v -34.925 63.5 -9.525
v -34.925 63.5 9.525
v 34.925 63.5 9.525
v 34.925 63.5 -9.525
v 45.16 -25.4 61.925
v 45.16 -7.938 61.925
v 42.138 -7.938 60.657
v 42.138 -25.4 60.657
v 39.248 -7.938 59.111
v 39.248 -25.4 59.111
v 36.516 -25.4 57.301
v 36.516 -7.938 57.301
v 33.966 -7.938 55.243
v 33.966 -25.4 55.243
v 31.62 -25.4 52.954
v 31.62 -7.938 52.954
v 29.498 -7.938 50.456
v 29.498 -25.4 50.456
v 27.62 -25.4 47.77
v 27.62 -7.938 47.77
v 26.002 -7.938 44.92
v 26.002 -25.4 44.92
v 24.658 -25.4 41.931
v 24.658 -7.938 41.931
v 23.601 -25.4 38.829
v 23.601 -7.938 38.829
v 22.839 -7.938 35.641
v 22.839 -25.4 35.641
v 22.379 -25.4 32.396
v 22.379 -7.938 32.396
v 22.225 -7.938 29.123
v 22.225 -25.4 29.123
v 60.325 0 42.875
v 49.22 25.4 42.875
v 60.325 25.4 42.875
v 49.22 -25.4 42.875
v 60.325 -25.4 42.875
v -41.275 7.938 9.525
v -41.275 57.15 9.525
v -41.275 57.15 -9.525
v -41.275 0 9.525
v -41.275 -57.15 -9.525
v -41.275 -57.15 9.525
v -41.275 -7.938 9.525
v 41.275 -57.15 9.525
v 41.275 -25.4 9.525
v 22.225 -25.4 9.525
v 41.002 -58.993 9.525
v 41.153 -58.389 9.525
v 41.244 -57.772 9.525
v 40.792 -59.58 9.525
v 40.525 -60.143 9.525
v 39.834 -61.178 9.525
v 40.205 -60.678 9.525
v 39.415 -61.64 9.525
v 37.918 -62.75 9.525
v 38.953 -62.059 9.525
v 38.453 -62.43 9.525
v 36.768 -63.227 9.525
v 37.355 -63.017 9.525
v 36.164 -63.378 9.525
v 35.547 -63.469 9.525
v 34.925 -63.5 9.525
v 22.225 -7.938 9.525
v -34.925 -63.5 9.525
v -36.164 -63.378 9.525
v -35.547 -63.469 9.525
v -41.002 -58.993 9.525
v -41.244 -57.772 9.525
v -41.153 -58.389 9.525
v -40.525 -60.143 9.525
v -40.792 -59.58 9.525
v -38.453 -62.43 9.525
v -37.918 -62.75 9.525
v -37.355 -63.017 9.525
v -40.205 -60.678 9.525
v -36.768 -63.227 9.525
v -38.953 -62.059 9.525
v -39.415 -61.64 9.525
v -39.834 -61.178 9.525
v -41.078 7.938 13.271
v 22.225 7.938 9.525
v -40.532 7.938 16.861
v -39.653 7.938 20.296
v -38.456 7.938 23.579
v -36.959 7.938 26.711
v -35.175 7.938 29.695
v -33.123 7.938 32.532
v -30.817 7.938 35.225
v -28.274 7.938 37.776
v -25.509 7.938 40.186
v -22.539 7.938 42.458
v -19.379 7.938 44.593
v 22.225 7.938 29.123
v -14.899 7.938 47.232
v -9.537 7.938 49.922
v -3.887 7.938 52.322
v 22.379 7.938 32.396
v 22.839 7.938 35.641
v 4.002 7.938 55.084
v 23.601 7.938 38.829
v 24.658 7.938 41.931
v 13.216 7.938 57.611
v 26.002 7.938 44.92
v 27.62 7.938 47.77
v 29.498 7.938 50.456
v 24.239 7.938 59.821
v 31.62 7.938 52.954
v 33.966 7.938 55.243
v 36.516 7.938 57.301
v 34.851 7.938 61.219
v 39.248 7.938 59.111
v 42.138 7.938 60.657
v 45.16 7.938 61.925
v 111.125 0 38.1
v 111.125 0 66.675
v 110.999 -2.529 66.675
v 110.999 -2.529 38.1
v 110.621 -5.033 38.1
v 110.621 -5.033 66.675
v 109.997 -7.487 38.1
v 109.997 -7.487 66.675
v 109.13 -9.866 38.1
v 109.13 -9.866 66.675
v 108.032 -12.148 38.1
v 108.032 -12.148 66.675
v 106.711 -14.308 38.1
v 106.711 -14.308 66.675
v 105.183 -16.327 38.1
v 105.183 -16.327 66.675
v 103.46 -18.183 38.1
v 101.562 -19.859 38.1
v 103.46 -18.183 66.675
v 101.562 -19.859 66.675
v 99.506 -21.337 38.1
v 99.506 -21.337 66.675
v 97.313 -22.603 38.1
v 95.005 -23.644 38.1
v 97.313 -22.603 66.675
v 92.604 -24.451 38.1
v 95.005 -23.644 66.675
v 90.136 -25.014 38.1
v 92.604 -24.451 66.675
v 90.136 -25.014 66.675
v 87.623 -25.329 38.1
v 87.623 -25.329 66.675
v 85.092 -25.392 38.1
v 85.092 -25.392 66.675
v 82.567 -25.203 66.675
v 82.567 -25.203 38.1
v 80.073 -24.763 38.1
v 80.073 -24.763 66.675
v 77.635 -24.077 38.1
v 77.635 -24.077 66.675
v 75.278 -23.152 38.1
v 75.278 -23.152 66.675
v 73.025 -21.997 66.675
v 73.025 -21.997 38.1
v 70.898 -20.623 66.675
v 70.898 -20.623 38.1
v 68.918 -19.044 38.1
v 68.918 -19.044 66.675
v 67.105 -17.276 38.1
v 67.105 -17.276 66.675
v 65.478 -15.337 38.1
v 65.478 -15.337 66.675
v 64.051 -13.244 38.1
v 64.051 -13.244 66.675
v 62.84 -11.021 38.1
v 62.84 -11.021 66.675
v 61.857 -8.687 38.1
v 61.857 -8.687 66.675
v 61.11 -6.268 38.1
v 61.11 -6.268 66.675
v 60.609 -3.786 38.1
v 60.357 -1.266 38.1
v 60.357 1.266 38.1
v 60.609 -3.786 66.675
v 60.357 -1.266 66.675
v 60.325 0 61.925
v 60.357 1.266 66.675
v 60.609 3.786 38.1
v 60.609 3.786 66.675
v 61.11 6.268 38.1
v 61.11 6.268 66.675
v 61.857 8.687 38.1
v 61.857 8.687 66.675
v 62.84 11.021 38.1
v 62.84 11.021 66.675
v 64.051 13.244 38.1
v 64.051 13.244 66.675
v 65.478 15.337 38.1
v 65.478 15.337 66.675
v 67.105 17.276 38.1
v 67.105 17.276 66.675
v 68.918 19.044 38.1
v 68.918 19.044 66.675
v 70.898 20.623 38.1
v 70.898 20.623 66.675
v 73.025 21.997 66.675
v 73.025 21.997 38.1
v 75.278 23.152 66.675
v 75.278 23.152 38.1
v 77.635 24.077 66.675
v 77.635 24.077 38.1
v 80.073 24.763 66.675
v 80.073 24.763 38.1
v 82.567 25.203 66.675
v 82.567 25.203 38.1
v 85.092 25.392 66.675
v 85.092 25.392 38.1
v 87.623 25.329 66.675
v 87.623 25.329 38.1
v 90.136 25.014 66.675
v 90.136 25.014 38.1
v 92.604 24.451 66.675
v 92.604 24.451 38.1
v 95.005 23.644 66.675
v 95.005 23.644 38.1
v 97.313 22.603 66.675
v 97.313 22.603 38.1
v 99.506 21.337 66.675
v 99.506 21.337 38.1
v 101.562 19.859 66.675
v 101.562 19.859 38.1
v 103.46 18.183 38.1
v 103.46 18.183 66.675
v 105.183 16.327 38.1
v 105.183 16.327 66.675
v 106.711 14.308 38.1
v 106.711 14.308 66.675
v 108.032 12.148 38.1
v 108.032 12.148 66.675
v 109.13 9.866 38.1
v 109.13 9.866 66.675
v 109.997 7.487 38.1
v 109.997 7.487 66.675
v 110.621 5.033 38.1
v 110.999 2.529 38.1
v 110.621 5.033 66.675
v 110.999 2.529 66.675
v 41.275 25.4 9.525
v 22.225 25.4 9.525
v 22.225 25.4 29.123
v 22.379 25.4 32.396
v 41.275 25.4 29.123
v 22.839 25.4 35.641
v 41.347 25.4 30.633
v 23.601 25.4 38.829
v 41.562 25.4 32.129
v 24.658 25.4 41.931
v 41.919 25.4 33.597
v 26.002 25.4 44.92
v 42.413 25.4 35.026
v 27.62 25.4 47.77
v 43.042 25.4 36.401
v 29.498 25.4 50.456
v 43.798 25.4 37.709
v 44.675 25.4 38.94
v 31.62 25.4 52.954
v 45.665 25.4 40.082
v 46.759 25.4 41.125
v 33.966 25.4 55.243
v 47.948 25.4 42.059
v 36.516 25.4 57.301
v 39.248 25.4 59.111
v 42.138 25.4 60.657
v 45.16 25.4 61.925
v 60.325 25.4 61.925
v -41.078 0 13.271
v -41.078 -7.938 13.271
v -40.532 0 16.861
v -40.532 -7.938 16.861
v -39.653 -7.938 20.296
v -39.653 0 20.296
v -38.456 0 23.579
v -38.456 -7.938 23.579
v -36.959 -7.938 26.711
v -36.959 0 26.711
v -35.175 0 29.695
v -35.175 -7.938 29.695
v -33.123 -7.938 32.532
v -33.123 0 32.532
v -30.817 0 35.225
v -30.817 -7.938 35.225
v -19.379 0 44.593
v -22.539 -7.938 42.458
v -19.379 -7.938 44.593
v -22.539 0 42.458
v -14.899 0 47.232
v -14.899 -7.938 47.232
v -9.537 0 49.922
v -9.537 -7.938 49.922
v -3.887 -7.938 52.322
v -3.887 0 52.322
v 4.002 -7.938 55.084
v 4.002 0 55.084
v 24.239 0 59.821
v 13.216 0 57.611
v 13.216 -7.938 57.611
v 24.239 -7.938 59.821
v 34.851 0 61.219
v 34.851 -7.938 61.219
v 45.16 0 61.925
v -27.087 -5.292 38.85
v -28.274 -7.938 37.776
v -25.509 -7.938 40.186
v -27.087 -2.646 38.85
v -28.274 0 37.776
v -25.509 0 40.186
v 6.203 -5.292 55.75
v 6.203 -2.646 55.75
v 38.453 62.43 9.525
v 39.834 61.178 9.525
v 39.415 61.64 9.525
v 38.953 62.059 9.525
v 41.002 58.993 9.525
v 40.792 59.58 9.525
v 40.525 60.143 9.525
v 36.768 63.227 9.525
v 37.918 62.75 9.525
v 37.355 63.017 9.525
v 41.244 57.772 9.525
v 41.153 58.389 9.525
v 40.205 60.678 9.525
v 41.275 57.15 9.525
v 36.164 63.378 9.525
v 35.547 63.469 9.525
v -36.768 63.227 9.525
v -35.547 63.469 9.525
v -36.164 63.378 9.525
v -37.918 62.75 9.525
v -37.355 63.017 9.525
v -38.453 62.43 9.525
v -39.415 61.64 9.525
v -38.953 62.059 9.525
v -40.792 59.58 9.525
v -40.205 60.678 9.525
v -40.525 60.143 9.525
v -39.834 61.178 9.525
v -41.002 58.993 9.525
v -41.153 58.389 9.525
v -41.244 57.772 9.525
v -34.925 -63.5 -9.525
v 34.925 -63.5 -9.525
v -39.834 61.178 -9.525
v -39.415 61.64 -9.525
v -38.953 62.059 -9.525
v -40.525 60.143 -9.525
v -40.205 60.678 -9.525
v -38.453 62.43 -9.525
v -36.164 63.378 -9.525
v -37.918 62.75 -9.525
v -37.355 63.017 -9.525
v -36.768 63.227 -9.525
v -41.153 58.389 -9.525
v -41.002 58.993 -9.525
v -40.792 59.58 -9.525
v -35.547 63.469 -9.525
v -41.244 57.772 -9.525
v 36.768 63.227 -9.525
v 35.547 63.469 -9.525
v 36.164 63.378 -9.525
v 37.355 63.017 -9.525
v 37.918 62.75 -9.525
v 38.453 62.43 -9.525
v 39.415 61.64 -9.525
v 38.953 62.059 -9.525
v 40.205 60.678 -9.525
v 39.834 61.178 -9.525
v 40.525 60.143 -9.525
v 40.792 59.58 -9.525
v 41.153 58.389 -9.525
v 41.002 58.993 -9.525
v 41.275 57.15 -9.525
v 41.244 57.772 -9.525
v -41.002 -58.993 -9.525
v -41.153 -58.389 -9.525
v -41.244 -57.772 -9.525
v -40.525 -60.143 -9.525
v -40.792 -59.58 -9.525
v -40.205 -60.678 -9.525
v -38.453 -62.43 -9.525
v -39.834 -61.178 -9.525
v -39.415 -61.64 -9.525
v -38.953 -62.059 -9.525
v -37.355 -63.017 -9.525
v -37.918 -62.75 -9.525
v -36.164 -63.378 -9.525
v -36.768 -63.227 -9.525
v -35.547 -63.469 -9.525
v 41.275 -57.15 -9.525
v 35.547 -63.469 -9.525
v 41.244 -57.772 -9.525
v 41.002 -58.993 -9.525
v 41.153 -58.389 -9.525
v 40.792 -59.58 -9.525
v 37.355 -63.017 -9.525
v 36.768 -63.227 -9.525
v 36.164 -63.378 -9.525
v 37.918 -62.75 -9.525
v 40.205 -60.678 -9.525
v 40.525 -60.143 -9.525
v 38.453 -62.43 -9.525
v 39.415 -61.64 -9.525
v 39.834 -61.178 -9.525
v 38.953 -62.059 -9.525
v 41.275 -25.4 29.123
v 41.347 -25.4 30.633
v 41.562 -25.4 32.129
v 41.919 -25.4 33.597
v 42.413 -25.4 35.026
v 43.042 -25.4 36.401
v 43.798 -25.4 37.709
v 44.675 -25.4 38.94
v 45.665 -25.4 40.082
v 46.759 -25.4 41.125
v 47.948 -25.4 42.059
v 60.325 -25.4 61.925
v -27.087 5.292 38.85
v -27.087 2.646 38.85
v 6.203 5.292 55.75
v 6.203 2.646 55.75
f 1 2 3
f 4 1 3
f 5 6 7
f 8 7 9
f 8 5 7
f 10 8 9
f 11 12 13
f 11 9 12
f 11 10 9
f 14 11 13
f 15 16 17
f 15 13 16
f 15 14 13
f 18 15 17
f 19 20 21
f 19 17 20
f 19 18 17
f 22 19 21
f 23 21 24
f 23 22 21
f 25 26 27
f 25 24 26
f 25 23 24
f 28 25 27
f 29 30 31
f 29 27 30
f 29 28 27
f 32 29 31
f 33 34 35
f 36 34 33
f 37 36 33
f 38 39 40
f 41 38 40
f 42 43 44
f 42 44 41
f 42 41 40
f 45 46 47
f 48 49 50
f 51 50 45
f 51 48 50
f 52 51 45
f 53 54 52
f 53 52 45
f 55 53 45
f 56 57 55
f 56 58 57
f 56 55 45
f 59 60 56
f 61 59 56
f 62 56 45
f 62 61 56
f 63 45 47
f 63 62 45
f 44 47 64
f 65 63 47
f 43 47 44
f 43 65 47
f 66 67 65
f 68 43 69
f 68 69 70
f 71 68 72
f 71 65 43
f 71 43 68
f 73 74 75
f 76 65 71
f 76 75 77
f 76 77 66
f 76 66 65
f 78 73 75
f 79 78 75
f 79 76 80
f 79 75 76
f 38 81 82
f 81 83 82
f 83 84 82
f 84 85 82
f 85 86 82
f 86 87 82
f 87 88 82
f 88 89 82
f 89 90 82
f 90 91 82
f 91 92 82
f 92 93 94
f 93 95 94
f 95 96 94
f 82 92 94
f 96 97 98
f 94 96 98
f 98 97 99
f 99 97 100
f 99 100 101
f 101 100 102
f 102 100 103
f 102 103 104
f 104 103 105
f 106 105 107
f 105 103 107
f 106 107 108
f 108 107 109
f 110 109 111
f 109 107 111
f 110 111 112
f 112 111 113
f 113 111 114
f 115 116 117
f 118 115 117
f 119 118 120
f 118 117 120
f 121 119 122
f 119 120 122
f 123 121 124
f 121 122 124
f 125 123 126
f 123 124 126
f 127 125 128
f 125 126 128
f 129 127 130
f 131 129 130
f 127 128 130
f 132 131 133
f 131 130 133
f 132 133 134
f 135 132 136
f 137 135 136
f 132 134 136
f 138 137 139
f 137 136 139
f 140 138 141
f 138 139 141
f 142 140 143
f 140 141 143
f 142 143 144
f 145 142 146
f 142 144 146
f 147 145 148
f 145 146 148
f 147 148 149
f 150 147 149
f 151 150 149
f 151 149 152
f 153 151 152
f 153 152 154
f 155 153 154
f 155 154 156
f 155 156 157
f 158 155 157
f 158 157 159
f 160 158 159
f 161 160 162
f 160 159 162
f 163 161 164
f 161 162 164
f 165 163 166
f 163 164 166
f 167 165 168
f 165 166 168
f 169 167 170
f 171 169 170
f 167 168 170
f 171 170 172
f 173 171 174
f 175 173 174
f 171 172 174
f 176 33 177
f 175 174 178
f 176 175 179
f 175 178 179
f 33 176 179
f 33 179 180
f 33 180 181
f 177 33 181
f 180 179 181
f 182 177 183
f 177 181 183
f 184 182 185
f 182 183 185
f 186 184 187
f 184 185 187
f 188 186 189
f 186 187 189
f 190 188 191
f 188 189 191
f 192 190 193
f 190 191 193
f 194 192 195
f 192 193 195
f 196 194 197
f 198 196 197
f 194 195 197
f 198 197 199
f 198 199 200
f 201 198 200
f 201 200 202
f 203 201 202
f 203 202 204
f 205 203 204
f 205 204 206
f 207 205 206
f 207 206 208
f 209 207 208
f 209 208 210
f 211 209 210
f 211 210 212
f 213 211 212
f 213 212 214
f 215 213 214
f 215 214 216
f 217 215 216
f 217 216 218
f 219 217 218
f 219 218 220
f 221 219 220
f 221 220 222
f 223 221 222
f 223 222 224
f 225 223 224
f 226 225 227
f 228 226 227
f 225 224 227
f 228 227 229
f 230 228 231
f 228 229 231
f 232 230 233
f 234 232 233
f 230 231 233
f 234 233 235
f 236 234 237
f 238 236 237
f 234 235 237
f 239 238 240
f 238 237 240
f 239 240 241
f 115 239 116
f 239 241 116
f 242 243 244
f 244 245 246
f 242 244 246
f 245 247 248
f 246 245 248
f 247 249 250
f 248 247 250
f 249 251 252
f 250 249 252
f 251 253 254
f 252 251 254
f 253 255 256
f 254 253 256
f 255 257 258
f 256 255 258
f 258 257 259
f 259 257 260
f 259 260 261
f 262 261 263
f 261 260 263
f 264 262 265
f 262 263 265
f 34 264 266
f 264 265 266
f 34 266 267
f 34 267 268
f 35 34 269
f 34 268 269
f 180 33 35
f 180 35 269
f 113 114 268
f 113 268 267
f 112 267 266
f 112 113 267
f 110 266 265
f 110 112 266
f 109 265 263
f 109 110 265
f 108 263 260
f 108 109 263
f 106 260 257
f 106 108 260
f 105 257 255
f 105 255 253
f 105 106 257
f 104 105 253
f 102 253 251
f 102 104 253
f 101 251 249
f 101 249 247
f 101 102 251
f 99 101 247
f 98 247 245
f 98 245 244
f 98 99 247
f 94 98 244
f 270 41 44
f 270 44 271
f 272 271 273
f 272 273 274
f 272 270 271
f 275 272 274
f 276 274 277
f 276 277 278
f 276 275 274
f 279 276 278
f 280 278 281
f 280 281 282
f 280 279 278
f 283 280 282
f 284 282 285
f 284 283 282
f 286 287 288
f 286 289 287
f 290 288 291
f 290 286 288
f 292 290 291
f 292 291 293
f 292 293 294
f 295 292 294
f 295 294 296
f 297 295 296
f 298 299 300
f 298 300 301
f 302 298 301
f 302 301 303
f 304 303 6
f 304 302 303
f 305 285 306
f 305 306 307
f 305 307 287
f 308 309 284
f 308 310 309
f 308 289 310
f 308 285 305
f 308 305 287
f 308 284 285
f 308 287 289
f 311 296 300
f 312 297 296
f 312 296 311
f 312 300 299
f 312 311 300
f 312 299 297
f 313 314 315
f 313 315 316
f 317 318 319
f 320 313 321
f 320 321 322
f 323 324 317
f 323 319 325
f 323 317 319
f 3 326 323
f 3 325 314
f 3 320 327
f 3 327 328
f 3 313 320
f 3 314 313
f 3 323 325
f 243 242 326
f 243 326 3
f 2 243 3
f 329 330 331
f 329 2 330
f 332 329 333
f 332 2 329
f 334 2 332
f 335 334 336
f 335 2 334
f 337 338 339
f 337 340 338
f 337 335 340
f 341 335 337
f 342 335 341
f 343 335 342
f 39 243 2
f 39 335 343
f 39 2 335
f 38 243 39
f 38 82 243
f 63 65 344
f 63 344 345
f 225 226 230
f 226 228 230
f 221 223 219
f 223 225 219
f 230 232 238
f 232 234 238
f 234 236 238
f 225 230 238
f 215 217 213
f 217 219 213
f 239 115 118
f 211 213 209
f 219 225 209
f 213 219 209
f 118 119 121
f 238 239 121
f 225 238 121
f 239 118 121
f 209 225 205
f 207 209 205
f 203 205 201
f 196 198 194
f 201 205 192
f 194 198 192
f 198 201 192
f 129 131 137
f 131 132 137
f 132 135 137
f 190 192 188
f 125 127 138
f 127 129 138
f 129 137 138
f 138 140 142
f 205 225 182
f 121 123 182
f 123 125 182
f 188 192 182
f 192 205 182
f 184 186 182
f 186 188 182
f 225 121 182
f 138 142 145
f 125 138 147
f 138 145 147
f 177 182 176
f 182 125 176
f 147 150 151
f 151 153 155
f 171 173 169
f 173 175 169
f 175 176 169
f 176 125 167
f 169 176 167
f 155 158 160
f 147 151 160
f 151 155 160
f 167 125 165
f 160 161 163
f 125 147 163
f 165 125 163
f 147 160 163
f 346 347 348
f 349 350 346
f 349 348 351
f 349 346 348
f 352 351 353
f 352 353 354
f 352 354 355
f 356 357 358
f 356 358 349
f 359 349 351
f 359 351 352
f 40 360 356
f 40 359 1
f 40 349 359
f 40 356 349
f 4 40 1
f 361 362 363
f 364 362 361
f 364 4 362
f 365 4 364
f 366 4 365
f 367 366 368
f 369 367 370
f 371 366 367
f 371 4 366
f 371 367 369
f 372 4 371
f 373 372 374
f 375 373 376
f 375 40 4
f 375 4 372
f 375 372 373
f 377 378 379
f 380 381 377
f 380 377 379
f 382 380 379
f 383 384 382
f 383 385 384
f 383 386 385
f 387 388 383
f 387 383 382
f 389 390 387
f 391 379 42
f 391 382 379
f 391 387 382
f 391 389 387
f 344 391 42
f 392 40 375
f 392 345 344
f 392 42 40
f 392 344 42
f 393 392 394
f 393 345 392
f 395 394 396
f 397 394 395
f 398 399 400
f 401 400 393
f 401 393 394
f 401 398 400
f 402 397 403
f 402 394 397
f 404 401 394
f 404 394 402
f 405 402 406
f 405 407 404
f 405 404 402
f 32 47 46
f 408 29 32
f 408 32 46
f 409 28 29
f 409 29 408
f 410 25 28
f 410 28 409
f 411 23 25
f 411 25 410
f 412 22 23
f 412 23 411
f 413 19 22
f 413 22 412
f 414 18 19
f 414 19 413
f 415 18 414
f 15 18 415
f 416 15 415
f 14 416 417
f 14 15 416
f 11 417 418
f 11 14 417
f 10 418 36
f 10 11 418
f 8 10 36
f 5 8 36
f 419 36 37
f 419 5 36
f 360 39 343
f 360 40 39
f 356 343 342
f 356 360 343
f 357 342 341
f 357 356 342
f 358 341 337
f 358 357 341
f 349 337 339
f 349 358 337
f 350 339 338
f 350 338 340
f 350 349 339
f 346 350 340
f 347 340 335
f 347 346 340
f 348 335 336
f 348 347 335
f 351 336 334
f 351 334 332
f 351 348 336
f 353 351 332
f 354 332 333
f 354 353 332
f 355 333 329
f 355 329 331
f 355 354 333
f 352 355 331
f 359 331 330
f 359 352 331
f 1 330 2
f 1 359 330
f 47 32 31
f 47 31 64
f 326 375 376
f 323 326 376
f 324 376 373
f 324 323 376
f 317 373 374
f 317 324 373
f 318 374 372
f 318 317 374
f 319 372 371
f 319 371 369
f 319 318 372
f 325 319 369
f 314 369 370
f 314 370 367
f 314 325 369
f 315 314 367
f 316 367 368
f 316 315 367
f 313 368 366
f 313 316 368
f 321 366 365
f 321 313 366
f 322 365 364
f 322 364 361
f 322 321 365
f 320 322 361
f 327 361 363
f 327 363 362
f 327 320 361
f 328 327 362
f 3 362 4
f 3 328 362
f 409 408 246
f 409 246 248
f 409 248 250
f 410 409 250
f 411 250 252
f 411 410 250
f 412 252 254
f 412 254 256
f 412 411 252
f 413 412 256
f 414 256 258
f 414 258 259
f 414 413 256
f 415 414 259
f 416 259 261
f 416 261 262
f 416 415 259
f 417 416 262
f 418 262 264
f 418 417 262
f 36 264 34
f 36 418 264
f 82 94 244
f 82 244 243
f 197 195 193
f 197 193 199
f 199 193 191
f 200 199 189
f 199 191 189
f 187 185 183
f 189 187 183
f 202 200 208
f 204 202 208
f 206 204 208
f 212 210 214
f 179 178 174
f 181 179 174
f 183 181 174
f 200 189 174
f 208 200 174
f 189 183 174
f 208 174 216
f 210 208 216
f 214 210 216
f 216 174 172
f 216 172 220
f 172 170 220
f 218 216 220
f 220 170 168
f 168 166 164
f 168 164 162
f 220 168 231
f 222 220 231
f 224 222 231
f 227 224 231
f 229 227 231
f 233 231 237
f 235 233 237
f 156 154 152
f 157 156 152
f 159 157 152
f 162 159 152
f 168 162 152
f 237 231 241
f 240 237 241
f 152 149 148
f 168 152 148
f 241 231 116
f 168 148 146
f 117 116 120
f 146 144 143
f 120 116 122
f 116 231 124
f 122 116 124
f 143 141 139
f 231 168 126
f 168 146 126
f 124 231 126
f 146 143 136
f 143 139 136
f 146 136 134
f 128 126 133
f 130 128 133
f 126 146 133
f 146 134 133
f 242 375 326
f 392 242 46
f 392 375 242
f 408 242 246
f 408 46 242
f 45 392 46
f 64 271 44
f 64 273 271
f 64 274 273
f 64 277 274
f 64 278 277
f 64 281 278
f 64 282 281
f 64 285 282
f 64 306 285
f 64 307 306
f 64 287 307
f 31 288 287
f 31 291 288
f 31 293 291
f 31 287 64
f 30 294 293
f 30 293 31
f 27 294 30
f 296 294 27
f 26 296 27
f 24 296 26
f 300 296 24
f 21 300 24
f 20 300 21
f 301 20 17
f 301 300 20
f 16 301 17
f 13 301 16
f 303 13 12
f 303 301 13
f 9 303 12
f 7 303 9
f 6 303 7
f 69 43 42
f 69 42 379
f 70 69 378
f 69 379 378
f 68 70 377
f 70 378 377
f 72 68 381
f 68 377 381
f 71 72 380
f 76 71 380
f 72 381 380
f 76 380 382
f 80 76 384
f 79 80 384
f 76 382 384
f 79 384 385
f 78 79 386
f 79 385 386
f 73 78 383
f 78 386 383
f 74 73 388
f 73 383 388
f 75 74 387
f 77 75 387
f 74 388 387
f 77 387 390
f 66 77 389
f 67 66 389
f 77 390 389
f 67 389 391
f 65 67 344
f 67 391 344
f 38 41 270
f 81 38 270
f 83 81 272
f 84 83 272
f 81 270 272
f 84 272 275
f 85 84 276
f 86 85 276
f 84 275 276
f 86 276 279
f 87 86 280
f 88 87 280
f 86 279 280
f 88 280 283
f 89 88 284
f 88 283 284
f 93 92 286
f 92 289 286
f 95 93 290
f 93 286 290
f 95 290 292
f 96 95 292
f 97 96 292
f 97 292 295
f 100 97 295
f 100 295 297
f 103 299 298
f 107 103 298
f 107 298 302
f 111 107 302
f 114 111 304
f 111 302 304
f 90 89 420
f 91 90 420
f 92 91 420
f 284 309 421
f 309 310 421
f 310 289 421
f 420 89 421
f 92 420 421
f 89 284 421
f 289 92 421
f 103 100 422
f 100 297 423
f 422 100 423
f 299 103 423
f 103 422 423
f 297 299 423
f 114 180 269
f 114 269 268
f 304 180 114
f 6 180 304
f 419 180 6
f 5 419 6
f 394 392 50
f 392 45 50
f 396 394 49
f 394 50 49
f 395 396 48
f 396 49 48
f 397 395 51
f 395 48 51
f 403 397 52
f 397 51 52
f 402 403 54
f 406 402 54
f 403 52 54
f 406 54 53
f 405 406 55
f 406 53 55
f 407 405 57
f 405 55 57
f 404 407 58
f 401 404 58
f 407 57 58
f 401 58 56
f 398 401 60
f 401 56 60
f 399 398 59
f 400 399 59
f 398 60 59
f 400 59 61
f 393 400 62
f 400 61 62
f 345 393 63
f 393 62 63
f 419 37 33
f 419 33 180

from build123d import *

# Parameters (mm, degrees)
F1_DEPTH = 63.5
F2_DEPTH = 25.4
F4_DEPTH = 7.9375
F5_R     = 6.35


with BuildPart() as f1:
    # F0 (on Front) → F1 (new body, symmetric)
    with BuildSketch(Plane.XZ):
        Polygon((41.275, -9.525), (41.275, 9.525), (22.225, 9.525), (-41.275, 9.525), (-41.275, -9.525), align=None)
    extrude(amount=F1_DEPTH, both=True)

    # F0 (on Front) → F2 (join, symmetric)
    with BuildSketch(Plane.XZ):
        with BuildLine():
            Line((22.225, 9.525), (41.275, 9.525))
            Line((41.275, 9.525), (41.275, 29.122715))
            ThreePointArc((41.275, 29.122715), (43.404014, 37.063968), (49.220008, 42.8752))
            Line((49.220008, 42.8752), (60.325, 42.8752))
            Line((60.325, 42.8752), (60.325, 61.9252))
            Line((60.325, 61.9252), (45.160314, 61.9252))
            ThreePointArc((45.160314, 61.9252), (28.527496, 49.135408), (22.225, 29.122715))
            Line((22.225, 29.122715), (22.225, 9.525))
        make_face()
    extrude(amount=F2_DEPTH, both=True)

    # F0 (on Front) → F3 (revolve)
    with BuildSketch(Plane.XZ):
        Polygon((85.725, 61.9252), (85.725, 42.8752), (85.725, 38.1), (111.125, 38.1), (111.125, 66.675), (85.725, 66.675), align=None)
    revolve(axis=Axis((85.725, 0, 52.3875), (0, 0, -1)))

    # F0 (on Front) → F4 (join, symmetric)
    with BuildSketch(Plane.XZ):
        with BuildLine():
            Line((-41.275, 9.525), (22.225, 9.525))
            Line((22.225, 9.525), (22.225, 29.122715))
            ThreePointArc((22.225, 29.122715), (28.527496, 49.135408), (45.160314, 61.9252))
            add(Edge.make_bspline(
                [(-41.275, 9.525), (-41.11658, 45.629572), (7.848142, 60.545977), (45.160314, 61.9252)],
                knots=[0, 0, 0, 0, 101.078407, 101.078407, 101.078407, 101.078407], degree=3))
        make_face()
    extrude(amount=F4_DEPTH, both=True)

    # F5
    f5_edges = [f1.edges().sort_by_distance(p)[0] for p in [
        (41.275, -63.5, 0),
        (-41.275, -63.5, 0),
        (41.275, 63.5, 0),
        (-41.275, 63.5, 0),
    ]]
    fillet(f5_edges, radius=F5_R)


solid = f1.part
